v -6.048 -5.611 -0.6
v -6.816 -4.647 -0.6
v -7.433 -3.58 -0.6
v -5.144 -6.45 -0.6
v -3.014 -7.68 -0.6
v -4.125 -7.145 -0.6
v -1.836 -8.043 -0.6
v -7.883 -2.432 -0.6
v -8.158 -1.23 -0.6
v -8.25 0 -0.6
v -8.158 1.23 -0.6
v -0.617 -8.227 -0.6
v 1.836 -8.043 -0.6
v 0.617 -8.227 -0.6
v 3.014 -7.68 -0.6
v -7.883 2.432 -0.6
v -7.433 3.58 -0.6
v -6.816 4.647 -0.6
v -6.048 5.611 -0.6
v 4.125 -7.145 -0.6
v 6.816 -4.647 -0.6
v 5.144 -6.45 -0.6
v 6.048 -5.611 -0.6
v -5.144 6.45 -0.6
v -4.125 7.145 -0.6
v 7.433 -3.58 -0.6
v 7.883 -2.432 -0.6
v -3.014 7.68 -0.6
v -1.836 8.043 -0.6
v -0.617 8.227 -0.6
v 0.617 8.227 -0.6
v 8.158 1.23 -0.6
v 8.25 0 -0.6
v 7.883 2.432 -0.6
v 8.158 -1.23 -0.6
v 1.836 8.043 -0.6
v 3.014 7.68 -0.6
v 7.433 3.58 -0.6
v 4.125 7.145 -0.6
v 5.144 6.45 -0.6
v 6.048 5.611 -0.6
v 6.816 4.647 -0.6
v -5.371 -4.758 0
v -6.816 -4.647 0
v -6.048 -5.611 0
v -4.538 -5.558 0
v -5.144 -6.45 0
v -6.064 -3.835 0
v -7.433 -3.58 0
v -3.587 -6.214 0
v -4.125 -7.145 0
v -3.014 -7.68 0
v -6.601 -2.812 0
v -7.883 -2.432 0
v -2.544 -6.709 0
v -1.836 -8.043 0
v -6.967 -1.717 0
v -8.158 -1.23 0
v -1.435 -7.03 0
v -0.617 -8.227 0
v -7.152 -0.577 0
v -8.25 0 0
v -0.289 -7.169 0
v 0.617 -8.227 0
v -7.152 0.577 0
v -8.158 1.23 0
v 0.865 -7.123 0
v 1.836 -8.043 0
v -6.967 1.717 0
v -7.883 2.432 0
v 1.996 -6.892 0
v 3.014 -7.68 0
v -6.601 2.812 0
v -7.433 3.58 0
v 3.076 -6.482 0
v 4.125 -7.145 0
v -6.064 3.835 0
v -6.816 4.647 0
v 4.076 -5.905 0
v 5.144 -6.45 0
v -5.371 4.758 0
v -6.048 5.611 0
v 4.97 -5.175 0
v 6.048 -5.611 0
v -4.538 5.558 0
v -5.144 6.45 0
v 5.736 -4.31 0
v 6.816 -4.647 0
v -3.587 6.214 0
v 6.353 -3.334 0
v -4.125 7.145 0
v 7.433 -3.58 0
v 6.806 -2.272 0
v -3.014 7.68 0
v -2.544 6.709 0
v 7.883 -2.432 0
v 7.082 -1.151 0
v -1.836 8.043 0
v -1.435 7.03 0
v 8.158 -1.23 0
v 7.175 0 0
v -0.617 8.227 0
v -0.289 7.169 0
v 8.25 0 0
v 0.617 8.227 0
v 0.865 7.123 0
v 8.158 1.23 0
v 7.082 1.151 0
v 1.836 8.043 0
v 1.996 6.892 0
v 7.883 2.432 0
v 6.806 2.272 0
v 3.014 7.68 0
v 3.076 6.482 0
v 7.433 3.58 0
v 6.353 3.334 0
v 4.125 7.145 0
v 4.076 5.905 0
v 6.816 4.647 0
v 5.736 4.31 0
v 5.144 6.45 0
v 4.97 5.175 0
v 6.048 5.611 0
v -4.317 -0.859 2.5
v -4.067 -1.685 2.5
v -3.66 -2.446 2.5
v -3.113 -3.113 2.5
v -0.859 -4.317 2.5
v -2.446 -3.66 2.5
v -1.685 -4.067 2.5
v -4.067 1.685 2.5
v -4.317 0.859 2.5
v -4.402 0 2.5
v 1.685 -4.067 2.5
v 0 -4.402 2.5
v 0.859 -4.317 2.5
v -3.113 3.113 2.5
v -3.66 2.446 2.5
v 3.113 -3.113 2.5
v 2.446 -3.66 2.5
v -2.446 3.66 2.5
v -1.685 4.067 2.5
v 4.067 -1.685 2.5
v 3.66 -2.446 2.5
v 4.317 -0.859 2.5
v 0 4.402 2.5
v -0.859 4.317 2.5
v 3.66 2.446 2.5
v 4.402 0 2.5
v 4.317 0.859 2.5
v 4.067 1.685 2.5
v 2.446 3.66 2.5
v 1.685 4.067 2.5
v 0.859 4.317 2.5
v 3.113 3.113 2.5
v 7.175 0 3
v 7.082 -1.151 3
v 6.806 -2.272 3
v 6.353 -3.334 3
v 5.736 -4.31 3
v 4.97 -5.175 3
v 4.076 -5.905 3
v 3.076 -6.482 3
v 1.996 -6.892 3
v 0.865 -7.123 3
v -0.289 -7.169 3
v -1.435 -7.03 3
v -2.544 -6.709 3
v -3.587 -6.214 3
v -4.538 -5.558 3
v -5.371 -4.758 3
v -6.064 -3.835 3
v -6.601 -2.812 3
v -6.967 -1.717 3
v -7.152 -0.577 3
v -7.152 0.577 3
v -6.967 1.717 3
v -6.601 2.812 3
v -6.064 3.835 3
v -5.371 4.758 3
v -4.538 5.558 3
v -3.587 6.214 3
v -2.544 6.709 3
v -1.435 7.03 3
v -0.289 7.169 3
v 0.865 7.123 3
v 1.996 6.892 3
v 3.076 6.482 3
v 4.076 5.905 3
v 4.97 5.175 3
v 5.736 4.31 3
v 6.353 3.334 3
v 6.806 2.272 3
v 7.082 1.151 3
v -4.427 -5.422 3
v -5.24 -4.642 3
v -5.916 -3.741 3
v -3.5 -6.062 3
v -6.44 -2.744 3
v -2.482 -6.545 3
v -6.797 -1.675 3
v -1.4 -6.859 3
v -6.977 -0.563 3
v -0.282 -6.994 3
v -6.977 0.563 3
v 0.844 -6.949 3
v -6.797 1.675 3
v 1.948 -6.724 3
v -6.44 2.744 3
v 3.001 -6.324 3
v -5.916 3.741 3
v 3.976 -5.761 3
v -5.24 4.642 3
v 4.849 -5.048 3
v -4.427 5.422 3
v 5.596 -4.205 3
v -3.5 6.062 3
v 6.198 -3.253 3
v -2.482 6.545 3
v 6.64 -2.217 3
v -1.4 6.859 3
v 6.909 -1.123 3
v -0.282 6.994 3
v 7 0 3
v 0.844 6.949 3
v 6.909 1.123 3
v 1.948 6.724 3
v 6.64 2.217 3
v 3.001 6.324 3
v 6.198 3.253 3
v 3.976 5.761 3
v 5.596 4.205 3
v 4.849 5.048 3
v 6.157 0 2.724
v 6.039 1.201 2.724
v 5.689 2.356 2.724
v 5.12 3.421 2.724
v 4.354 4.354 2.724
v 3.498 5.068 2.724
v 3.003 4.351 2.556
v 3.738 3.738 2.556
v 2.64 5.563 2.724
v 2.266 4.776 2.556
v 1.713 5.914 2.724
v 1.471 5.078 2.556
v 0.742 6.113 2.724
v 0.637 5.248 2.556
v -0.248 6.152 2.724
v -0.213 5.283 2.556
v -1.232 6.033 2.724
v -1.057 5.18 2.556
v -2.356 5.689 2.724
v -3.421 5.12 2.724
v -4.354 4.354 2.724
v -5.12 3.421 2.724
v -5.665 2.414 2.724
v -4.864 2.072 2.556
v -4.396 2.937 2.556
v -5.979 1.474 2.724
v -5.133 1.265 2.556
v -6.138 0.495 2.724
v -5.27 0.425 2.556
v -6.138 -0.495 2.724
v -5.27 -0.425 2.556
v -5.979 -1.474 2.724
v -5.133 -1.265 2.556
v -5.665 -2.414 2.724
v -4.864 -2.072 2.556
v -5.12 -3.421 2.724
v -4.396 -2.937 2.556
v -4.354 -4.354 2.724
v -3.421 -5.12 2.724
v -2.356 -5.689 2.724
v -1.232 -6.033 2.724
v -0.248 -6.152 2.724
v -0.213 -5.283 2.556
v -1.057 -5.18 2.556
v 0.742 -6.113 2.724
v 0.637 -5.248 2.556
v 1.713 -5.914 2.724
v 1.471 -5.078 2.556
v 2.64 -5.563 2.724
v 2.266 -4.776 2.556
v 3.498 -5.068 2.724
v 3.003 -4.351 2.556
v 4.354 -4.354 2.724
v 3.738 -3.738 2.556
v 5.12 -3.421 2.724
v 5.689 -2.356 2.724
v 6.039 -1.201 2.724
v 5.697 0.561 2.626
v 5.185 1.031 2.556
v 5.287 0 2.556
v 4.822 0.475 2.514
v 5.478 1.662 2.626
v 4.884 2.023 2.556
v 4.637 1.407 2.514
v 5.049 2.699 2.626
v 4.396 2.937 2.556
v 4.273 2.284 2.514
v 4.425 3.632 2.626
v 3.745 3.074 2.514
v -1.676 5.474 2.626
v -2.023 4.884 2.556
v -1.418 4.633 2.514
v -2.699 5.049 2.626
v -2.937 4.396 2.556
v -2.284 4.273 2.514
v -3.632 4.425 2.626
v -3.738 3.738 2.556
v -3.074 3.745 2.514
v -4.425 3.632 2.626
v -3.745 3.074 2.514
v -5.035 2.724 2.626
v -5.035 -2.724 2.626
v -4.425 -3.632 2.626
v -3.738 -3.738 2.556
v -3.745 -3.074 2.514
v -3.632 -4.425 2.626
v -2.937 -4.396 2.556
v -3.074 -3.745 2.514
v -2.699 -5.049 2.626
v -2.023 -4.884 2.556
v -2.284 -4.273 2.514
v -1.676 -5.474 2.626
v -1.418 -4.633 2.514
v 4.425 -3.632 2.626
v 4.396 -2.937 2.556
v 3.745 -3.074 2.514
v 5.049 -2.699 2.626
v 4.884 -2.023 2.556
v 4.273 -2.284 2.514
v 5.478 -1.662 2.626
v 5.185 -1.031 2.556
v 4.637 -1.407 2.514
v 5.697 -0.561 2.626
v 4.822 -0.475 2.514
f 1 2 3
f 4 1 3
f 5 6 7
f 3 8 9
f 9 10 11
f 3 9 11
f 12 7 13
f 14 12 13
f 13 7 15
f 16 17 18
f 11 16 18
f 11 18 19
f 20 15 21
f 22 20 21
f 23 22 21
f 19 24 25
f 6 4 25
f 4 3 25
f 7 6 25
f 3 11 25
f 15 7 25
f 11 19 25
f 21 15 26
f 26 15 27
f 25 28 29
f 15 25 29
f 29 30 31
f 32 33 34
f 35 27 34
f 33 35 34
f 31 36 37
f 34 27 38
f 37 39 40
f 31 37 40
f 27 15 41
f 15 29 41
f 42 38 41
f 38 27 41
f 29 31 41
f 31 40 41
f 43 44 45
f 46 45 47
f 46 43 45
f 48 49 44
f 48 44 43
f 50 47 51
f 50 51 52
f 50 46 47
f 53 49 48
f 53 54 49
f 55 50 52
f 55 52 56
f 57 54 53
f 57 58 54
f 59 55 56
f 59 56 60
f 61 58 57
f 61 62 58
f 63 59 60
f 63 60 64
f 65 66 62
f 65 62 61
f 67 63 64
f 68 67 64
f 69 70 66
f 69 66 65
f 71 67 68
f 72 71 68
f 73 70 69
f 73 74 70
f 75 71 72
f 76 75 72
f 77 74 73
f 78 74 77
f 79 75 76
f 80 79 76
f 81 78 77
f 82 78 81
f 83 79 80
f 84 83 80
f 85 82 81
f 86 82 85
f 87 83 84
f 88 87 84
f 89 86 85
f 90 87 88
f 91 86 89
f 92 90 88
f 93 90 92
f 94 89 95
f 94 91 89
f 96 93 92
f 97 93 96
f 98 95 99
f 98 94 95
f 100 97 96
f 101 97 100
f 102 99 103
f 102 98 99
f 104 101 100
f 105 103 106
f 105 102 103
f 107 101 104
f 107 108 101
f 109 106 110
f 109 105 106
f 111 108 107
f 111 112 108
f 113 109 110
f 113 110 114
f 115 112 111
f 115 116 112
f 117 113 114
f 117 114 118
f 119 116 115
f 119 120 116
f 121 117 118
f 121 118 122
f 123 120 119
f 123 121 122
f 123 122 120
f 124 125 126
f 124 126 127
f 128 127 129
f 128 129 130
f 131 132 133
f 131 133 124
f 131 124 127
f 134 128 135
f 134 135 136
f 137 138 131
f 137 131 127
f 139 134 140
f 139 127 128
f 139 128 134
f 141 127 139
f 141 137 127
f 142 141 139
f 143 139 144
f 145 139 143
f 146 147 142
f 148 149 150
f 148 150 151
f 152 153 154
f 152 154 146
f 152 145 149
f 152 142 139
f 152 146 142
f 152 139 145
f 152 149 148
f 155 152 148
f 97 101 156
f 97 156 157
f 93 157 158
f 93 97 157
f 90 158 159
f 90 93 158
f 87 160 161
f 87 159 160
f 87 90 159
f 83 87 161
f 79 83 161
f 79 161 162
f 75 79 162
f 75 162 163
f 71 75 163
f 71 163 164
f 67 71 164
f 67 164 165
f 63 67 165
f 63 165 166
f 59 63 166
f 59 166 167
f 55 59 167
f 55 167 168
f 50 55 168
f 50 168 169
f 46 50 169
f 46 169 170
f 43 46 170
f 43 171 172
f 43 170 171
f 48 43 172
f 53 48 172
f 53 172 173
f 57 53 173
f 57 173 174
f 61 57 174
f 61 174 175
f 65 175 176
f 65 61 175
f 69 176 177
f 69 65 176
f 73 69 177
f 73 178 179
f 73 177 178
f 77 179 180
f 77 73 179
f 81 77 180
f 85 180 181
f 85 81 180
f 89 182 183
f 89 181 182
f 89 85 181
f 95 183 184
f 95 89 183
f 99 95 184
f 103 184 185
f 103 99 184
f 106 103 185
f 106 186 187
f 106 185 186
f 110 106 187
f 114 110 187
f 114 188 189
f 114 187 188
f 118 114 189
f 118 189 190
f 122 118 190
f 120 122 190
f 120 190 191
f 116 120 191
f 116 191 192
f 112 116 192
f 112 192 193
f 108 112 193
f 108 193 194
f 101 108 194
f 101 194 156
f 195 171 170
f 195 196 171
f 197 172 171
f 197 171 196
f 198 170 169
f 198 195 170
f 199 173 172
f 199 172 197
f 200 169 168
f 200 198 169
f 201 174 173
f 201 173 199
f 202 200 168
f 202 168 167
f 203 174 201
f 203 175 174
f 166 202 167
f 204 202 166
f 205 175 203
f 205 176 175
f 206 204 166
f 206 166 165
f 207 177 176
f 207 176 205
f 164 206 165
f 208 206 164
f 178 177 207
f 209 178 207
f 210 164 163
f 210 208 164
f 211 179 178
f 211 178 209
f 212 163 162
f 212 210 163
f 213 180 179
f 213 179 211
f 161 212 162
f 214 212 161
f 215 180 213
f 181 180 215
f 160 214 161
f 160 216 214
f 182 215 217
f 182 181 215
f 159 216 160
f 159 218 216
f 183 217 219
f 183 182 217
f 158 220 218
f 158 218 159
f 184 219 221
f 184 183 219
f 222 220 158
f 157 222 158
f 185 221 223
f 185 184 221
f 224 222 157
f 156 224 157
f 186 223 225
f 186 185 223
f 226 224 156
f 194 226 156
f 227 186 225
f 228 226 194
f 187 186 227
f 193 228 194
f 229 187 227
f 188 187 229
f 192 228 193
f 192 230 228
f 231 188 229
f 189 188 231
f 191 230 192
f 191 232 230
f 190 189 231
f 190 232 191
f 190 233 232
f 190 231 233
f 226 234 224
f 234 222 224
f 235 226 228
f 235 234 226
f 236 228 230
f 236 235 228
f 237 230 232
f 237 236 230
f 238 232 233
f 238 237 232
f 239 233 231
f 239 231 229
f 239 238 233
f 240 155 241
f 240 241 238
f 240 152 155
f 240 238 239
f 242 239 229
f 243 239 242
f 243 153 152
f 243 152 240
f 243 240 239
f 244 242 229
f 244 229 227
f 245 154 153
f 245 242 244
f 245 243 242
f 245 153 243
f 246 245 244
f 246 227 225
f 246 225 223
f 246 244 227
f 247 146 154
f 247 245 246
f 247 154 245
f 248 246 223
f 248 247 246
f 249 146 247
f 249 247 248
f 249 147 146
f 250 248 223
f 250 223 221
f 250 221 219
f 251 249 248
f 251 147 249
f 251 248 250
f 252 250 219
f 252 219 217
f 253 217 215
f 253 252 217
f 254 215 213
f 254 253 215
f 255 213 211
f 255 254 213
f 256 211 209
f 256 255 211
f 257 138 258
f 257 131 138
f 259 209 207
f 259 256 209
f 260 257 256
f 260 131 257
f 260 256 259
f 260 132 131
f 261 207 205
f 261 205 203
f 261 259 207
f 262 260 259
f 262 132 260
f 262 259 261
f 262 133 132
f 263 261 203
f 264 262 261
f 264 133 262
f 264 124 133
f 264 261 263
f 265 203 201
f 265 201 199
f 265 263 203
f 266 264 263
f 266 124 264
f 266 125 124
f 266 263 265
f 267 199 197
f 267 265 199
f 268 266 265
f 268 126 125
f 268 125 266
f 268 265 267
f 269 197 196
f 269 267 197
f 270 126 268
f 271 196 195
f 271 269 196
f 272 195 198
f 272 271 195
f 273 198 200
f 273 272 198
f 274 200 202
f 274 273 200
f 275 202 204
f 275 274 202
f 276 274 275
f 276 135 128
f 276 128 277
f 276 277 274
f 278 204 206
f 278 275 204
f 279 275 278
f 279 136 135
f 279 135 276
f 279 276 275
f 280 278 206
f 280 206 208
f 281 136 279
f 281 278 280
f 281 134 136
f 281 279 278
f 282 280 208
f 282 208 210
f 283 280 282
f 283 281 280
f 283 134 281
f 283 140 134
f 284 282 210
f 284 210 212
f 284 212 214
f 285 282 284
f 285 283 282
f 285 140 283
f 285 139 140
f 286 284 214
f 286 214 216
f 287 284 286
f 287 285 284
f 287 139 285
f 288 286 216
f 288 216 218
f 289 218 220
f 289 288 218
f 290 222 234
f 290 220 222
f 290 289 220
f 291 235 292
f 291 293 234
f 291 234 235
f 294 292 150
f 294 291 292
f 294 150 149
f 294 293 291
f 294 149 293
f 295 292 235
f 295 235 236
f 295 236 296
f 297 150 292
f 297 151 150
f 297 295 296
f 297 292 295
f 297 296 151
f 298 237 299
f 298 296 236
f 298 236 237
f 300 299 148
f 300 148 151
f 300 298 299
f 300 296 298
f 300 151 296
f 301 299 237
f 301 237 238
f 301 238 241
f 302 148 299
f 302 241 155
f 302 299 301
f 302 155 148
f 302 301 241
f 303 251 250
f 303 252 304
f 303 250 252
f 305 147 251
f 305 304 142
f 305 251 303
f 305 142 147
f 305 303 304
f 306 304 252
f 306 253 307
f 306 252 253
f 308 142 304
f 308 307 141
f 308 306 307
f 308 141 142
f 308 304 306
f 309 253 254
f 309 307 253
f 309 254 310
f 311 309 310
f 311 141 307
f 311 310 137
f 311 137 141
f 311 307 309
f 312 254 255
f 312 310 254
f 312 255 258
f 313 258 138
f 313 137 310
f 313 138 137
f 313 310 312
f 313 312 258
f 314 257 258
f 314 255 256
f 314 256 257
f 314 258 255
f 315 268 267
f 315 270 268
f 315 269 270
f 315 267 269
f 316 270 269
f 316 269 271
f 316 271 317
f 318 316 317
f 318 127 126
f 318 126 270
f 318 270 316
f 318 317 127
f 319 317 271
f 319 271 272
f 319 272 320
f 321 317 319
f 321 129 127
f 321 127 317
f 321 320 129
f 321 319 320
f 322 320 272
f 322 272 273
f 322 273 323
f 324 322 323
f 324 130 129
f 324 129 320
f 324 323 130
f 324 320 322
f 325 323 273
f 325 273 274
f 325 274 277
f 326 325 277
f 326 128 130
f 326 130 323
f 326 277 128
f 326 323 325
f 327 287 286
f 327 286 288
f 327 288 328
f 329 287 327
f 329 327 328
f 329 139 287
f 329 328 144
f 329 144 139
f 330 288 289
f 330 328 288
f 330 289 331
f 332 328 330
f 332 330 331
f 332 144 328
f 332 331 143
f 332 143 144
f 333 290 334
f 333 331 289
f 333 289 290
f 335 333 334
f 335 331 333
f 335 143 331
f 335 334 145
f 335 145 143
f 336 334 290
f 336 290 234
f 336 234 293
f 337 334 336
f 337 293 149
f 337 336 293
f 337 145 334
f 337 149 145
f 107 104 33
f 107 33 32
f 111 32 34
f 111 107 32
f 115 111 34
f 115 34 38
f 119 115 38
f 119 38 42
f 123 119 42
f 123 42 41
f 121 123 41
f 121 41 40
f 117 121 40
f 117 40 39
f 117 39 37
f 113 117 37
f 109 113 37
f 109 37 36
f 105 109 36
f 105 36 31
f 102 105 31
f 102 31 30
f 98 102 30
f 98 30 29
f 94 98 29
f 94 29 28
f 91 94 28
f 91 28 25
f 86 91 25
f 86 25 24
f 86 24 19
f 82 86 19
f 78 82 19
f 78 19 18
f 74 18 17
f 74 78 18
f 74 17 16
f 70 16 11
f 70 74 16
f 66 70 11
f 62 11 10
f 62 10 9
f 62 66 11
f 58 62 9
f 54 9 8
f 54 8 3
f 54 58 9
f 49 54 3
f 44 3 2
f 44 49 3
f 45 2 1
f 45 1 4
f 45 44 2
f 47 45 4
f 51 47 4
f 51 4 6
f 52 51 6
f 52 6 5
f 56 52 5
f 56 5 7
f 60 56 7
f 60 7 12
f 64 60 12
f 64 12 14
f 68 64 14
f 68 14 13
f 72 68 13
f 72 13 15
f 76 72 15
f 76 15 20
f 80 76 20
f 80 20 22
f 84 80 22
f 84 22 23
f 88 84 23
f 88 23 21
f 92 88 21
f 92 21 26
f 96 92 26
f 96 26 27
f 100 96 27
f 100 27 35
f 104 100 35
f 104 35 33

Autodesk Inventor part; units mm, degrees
ref_plane "YZ Plane" through (0, 0, 0) normal (1, 0, 0) x (0, 1, 0)
ref_plane "XZ Plane" through (0, 0, 0) normal (0, 1, 0) x (-1, 0, 0)
ref_plane "XY Plane" through (0, 0, 0) normal (0, 0, 1) x (1, 0, 0)
sketch "Sketch1" plane through (0, 0, 0) normal (0, 0, 1) x (1, 0, 0)
  circle A0 centre (0, 0) radius 7.175
  circle A1 centre (0, 0) radius 8.25
  dimension "d0" = 14.35
  dimension "d1" = 16.5
extrude "Extrusion1" add sketch "Sketch1" along normal blind 3 contours A0
extrude "Extrusion2" add sketch "Sketch1" against normal blind 0.6 contours A0 | A1
sketch "Sketch2" plane through (0, 0, 3) normal (0, 0, 1) x (1, 0, 0)
  circle A0 centre (0, 0) radius 7
  dimension "d6" = 14
extrude "Extrusion3" cut sketch "Sketch2" against normal blind 0.5
fillet "Fillet1" radius 7 1 edges at (-7, 0, 2.5)
properties part number "pwrButton"
